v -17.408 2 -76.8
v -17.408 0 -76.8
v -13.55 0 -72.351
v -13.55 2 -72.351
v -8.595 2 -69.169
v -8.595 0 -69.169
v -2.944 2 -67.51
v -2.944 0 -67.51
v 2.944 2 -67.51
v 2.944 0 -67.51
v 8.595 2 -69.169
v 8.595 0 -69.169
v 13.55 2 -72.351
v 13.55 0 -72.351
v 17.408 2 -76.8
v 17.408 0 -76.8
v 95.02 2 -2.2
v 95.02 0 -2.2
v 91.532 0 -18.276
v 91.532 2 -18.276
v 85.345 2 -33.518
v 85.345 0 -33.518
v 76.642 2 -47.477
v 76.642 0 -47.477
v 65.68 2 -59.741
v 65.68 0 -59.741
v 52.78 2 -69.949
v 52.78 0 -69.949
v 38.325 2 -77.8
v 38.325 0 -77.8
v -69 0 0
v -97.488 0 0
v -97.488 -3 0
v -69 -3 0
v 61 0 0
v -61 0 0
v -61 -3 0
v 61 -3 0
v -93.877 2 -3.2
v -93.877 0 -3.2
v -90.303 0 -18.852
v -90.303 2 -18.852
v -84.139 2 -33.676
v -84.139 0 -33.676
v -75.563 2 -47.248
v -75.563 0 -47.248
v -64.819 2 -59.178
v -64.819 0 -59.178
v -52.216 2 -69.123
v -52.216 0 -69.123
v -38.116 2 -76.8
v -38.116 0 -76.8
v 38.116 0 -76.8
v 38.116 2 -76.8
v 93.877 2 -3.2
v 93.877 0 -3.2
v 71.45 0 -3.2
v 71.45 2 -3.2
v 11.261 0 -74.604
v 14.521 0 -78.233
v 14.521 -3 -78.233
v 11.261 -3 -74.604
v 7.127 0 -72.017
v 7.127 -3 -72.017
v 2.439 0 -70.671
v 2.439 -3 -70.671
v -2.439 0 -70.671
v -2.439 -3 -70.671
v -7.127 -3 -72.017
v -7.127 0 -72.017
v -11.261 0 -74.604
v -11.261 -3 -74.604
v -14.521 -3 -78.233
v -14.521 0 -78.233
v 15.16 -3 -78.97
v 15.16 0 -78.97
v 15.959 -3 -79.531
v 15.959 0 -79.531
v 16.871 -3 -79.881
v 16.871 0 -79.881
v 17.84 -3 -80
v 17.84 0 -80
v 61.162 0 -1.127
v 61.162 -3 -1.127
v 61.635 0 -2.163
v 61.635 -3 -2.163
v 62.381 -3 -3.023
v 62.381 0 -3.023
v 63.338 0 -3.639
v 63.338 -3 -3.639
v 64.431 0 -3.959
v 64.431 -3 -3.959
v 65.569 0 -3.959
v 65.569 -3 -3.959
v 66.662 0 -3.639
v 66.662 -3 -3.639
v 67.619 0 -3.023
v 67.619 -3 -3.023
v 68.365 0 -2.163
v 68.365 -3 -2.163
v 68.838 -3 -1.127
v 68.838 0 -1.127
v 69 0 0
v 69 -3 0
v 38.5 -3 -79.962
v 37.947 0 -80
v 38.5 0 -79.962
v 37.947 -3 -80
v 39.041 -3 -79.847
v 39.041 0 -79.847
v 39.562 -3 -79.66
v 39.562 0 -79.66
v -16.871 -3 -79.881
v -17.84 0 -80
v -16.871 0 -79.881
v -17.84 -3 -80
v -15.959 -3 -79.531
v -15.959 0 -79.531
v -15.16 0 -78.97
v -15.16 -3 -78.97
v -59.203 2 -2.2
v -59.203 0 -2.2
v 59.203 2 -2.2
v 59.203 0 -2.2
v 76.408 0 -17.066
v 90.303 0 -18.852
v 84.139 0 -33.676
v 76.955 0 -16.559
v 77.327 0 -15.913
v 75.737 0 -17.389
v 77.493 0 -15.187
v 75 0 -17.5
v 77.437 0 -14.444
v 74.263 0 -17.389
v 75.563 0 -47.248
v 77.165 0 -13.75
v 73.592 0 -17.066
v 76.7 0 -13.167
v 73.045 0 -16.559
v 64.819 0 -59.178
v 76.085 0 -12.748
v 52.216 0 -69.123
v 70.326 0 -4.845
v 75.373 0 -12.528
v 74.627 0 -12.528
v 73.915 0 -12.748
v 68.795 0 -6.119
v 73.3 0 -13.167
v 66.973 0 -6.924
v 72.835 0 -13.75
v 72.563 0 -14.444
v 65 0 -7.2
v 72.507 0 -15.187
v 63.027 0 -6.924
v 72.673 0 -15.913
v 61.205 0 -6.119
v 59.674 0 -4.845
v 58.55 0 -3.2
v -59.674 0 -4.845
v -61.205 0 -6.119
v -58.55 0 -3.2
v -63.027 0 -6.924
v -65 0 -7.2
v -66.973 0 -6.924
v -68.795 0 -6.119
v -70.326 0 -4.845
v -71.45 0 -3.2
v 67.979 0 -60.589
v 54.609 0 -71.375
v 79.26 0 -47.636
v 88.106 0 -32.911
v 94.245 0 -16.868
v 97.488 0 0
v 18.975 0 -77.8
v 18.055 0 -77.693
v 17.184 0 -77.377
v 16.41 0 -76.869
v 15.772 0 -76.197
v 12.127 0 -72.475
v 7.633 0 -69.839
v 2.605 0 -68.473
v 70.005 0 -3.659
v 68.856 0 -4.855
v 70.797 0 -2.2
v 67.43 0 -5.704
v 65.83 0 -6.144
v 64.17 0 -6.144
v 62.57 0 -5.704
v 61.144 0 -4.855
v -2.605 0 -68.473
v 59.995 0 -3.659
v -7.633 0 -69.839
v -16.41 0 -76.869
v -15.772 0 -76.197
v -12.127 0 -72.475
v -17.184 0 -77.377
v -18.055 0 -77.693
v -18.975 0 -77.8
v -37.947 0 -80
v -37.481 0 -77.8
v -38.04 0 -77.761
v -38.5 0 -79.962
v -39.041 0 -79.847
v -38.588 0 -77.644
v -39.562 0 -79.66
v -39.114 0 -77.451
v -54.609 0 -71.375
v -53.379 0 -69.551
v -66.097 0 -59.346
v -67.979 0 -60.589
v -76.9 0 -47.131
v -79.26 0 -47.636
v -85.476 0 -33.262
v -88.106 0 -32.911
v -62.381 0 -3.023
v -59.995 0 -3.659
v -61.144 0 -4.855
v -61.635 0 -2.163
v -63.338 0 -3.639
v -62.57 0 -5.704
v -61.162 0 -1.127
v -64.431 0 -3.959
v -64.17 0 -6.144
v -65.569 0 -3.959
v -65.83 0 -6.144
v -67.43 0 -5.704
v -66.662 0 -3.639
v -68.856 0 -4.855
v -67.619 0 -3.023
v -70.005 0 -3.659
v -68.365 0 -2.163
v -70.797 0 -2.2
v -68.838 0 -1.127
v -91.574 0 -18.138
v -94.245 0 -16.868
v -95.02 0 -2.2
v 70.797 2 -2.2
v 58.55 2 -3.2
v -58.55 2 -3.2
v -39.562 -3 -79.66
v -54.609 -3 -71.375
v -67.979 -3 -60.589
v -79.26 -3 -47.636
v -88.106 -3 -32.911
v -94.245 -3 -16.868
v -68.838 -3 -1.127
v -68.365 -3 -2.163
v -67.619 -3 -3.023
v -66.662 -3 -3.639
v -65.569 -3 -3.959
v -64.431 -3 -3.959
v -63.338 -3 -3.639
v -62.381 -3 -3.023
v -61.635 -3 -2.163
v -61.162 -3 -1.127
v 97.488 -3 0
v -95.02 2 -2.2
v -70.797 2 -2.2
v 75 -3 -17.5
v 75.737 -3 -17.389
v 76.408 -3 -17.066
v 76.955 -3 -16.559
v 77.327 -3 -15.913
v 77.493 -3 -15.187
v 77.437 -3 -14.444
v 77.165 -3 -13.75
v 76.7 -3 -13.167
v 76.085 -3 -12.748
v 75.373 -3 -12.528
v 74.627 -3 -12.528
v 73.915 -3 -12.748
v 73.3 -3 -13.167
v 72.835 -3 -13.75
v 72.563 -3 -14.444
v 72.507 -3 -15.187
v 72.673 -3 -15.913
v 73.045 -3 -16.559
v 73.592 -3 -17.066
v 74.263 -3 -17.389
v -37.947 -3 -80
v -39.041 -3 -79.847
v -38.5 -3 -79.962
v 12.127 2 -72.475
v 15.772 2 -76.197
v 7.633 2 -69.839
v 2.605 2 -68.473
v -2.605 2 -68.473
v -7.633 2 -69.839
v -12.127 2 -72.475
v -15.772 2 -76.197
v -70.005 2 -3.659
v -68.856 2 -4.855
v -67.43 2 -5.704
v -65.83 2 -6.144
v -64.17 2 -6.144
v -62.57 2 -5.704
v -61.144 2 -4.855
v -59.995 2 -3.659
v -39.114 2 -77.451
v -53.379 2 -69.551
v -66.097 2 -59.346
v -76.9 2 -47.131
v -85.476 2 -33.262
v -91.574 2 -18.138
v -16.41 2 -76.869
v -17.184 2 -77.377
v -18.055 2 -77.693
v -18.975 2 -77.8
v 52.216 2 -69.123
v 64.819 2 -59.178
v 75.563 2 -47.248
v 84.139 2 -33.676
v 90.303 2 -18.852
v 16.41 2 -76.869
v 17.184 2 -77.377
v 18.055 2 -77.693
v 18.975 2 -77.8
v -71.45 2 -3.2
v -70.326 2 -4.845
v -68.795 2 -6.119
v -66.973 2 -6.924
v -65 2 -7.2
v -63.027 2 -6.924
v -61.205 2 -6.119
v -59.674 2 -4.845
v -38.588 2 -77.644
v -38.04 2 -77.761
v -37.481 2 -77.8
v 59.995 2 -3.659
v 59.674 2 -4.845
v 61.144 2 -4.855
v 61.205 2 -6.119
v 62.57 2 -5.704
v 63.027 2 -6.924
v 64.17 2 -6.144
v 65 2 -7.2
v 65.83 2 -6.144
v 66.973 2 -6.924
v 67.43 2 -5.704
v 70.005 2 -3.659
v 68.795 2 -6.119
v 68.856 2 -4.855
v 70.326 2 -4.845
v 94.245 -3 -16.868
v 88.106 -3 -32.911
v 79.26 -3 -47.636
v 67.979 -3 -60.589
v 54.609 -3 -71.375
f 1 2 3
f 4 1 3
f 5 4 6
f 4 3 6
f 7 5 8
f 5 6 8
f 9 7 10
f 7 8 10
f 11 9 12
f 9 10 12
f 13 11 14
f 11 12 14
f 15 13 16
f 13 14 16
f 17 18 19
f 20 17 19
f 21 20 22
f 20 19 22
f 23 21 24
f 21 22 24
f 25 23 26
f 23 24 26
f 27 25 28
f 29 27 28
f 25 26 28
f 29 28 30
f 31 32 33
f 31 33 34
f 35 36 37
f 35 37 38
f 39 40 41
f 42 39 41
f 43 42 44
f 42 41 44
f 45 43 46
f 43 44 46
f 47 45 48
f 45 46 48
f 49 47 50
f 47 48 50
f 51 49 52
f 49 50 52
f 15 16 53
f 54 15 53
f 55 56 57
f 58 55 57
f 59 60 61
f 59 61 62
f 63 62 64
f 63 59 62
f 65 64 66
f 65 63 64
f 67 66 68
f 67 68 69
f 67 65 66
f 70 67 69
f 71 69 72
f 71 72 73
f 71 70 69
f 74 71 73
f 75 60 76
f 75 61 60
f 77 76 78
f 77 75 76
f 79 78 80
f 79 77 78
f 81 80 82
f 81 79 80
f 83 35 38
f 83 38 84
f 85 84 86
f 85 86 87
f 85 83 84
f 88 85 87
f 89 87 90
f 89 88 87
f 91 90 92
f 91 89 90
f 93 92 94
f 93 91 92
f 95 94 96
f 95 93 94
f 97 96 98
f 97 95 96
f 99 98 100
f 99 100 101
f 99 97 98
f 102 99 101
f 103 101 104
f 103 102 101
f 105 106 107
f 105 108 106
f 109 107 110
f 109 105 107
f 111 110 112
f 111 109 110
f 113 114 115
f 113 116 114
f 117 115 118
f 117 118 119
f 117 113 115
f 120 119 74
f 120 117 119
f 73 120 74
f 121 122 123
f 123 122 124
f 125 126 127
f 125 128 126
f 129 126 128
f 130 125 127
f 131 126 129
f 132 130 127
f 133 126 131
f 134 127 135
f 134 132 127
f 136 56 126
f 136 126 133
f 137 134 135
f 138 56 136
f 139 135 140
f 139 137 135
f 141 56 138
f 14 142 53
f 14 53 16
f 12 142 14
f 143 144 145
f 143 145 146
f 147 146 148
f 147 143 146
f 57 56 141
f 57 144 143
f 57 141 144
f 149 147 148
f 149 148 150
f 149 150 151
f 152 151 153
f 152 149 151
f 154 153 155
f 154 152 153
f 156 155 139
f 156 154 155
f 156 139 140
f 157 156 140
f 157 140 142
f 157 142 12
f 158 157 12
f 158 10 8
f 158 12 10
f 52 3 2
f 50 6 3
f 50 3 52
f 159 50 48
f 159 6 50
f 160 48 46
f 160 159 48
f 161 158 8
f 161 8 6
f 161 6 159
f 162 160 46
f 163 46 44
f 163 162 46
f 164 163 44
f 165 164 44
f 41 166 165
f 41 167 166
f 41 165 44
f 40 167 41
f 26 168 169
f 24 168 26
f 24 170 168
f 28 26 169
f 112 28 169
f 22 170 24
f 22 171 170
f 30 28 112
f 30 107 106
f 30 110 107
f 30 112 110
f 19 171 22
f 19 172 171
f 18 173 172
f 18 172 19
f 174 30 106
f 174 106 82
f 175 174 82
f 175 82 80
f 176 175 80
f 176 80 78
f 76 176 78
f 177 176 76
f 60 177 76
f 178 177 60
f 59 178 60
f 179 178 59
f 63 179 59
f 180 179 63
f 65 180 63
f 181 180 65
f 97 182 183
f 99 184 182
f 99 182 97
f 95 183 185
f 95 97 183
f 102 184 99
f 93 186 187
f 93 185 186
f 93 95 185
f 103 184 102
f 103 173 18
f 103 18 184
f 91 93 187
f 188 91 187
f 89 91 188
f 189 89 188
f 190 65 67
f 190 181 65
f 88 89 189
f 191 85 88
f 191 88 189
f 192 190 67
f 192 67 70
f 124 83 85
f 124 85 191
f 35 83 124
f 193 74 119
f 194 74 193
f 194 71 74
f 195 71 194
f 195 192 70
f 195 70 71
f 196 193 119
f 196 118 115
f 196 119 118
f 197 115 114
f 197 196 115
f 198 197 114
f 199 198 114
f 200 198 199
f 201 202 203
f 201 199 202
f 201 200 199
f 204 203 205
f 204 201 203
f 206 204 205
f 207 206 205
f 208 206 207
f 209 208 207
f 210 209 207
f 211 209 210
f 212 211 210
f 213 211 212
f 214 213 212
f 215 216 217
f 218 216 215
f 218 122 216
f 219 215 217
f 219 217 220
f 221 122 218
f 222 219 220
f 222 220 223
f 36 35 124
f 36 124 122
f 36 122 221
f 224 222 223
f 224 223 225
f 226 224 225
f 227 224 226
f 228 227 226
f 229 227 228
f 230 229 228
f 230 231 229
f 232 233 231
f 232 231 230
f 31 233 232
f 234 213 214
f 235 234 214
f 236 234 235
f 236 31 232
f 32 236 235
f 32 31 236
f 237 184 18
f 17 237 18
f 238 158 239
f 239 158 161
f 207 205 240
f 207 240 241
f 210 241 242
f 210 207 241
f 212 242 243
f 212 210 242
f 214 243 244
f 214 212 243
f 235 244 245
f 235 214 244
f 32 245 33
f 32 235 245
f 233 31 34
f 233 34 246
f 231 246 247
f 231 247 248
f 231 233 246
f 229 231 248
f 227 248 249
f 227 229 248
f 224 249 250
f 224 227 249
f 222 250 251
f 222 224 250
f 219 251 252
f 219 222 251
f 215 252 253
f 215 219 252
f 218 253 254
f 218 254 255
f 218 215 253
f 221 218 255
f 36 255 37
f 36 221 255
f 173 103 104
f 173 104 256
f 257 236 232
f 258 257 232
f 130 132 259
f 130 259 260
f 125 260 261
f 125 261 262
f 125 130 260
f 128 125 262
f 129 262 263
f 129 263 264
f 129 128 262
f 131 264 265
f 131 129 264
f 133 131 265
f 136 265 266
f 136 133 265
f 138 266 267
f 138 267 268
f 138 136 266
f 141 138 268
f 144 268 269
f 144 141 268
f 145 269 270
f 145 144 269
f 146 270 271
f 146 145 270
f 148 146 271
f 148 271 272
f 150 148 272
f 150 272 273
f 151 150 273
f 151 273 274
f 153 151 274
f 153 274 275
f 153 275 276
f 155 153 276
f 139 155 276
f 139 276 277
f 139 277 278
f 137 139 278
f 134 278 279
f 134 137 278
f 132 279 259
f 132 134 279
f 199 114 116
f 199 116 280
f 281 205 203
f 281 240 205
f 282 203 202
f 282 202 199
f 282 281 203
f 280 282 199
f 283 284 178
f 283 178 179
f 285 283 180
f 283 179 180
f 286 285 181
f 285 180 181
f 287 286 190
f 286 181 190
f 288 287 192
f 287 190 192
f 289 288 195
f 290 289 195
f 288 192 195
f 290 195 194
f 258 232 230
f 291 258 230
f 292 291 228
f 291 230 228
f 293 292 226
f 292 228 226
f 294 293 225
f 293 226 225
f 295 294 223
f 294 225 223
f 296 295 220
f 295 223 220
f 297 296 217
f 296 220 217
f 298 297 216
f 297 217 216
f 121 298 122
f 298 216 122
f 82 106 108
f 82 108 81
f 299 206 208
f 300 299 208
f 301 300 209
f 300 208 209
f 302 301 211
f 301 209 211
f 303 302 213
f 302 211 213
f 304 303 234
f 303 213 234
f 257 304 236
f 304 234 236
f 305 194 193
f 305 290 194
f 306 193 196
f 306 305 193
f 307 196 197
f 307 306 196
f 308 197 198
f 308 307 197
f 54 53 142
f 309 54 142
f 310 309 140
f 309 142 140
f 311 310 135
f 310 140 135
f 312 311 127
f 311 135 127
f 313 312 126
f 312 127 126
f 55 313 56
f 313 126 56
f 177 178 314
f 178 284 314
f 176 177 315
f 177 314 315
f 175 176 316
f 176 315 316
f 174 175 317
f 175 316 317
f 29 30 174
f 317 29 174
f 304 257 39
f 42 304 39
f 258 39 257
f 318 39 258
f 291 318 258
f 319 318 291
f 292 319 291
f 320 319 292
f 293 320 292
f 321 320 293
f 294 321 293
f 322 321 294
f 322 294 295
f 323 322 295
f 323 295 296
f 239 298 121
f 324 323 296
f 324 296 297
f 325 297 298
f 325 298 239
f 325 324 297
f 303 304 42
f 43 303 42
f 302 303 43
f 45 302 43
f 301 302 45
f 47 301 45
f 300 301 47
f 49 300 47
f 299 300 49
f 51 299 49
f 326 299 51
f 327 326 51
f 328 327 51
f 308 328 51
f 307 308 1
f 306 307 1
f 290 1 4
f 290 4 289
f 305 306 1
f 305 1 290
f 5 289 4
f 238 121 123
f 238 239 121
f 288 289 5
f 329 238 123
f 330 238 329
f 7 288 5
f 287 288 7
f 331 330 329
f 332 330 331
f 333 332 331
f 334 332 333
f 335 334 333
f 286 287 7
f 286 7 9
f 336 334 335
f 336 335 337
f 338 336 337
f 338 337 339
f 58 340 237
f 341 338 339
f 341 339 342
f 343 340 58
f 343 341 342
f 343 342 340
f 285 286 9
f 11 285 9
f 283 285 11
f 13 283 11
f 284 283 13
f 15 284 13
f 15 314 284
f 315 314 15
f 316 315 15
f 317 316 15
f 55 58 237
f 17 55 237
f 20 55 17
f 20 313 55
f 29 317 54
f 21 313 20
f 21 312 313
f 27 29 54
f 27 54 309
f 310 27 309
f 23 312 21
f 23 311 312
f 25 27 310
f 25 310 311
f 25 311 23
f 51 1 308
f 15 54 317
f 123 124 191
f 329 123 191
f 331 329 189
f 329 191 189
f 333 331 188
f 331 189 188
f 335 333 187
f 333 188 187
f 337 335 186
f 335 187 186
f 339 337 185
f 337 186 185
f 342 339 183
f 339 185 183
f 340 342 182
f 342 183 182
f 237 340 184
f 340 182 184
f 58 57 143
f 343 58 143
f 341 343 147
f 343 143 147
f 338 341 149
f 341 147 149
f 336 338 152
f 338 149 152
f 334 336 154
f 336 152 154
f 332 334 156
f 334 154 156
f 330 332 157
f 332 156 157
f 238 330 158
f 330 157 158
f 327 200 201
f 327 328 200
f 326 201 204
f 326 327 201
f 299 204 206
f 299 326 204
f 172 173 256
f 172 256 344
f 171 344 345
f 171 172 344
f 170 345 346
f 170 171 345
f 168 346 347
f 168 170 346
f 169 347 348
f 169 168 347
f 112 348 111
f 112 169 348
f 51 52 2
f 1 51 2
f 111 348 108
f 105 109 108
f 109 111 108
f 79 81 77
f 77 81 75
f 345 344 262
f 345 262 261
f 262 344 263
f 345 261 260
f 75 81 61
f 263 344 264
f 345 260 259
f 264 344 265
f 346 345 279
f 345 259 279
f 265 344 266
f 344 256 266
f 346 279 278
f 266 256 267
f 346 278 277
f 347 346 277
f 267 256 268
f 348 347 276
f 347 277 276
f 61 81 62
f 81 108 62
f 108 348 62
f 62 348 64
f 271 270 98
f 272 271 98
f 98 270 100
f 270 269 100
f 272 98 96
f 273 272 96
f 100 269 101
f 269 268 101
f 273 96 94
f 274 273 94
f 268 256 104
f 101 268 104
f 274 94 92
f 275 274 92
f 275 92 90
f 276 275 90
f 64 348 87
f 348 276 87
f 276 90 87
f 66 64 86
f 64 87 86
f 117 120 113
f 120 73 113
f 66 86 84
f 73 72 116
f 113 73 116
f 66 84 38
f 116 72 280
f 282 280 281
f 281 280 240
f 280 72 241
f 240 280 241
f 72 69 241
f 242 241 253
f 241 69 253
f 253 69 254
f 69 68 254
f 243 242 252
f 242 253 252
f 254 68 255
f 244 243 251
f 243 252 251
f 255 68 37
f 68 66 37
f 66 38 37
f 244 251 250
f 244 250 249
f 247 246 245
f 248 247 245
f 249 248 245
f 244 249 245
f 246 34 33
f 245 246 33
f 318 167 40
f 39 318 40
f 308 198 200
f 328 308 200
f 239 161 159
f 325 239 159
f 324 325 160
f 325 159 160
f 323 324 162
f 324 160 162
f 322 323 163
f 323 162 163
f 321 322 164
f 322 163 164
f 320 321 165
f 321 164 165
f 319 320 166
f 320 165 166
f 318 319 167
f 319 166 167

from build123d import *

# Parameters (mm, degrees)
SKETCH_1_R      = 2.5
EXTRUDE_1_DEPTH = 3
THICKEN_1_DEPTH = 2
FILLET_6_R      = 4


# Read off the part's stored shape, not the designer's step: 加厚1
with BuildPart() as part:
    # 草图1 → 凸台-拉伸1 (new body)
    with BuildSketch(Plane.XZ):
        with BuildLine():
            Line((-97.488460856, 0), (-69, 0))
            ThreePointArc((-69, 0), (-65, -4), (-61, 0))
            Line((-61, 0), (61, 0))
            ThreePointArc((61, 0), (65, -4), (69, 0))
            Line((69, 0), (97.488460856, 0))
            ThreePointArc((97.488460856, 0), (79.00867922, -47.979553361), (38.781438859, -80))
            Line((38.781438859, -80), (15.564382416, -80))
            ThreePointArc((15.564382416, -80), (0, -70.5), (-15.564382416, -80))
            Line((-15.564382416, -80), (-38.781438859, -80))
            ThreePointArc((-38.781438859, -80), (-79.00867922, -47.979553361), (-97.488460856, 0))
        make_face()
        with Locations(Location((75, -15, 0), (0, 0, 270))):
            Circle(SKETCH_1_R, mode=Mode.SUBTRACT)
    extrude(amount=EXTRUDE_1_DEPTH)

    # 加厚1 outline → 加厚1 (add)
    with BuildSketch(Plane(origin=(0, 0, 0), x_dir=(1, 0, 0), z_dir=(0, 1, 0))):
        with BuildLine():
            ThreePointArc((16.853782958, 77.8), (0, 68.3), (-16.853782958, 77.8))
            Line((-16.853782958, 77.8), (-38.324926614, 77.8))
            ThreePointArc((-38.324926614, 77.8), (-76.642398339, 47.476802076), (-95.019997895, 2.2))
            Line((-95.019997895, 2.2), (-70.796550698, 2.2))
            ThreePointArc((-70.796550698, 2.2), (-65, 6.2), (-59.203449302, 2.2))
            Line((-59.203449302, 2.2), (59.203449302, 2.2))
            ThreePointArc((59.203449302, 2.2), (65, 6.2), (70.796550698, 2.2))
            Line((70.796550698, 2.2), (95.019997895, 2.2))
            ThreePointArc((95.019997895, 2.2), (76.642398339, 47.476802076), (38.324926614, 77.8))
            Line((38.324926614, 77.8), (16.853782958, 77.8))
        make_face()
        with BuildLine():
            Line((-38.115613599, 76.8), (-17.408331339, 76.8))
            ThreePointArc((-17.408331339, 76.8), (0, 67.3), (17.408331339, 76.8))
            Line((17.408331339, 76.8), (38.115613599, 76.8))
            ThreePointArc((38.115613599, 76.8), (75.562692375, 47.247877874), (93.876514635, 3.2))
            Line((93.876514635, 3.2), (71.449806199, 3.2))
            ThreePointArc((71.449806199, 3.2), (65, 7.2), (58.550193801, 3.2))
            Line((58.550193801, 3.2), (-58.550193801, 3.2))
            ThreePointArc((-58.550193801, 3.2), (-65, 7.2), (-71.449806199, 3.2))
            Line((-71.449806199, 3.2), (-93.876514635, 3.2))
            ThreePointArc((-93.876514635, 3.2), (-75.562692375, 47.247877874), (-38.115613599, 76.8))
        make_face(mode=Mode.SUBTRACT)
    extrude(amount=THICKEN_1_DEPTH)

    # 圆角6
    fillet_6_edges = [part.edges().sort_by_distance(p)[0] for p in [
        (-38.781438859, -1.5, -80),
        (-15.564382416, -1.5, -80),
        (15.564382416, -1.5, -80),
        (38.781438859, -1.5, -80),
        (-38.324926614, 1, -77.8),
        (-16.853782958, 1, -77.8),
        (16.853782958, 1, -77.8),
    ]]
    fillet(fillet_6_edges, radius=FILLET_6_R)


solid = part.part
